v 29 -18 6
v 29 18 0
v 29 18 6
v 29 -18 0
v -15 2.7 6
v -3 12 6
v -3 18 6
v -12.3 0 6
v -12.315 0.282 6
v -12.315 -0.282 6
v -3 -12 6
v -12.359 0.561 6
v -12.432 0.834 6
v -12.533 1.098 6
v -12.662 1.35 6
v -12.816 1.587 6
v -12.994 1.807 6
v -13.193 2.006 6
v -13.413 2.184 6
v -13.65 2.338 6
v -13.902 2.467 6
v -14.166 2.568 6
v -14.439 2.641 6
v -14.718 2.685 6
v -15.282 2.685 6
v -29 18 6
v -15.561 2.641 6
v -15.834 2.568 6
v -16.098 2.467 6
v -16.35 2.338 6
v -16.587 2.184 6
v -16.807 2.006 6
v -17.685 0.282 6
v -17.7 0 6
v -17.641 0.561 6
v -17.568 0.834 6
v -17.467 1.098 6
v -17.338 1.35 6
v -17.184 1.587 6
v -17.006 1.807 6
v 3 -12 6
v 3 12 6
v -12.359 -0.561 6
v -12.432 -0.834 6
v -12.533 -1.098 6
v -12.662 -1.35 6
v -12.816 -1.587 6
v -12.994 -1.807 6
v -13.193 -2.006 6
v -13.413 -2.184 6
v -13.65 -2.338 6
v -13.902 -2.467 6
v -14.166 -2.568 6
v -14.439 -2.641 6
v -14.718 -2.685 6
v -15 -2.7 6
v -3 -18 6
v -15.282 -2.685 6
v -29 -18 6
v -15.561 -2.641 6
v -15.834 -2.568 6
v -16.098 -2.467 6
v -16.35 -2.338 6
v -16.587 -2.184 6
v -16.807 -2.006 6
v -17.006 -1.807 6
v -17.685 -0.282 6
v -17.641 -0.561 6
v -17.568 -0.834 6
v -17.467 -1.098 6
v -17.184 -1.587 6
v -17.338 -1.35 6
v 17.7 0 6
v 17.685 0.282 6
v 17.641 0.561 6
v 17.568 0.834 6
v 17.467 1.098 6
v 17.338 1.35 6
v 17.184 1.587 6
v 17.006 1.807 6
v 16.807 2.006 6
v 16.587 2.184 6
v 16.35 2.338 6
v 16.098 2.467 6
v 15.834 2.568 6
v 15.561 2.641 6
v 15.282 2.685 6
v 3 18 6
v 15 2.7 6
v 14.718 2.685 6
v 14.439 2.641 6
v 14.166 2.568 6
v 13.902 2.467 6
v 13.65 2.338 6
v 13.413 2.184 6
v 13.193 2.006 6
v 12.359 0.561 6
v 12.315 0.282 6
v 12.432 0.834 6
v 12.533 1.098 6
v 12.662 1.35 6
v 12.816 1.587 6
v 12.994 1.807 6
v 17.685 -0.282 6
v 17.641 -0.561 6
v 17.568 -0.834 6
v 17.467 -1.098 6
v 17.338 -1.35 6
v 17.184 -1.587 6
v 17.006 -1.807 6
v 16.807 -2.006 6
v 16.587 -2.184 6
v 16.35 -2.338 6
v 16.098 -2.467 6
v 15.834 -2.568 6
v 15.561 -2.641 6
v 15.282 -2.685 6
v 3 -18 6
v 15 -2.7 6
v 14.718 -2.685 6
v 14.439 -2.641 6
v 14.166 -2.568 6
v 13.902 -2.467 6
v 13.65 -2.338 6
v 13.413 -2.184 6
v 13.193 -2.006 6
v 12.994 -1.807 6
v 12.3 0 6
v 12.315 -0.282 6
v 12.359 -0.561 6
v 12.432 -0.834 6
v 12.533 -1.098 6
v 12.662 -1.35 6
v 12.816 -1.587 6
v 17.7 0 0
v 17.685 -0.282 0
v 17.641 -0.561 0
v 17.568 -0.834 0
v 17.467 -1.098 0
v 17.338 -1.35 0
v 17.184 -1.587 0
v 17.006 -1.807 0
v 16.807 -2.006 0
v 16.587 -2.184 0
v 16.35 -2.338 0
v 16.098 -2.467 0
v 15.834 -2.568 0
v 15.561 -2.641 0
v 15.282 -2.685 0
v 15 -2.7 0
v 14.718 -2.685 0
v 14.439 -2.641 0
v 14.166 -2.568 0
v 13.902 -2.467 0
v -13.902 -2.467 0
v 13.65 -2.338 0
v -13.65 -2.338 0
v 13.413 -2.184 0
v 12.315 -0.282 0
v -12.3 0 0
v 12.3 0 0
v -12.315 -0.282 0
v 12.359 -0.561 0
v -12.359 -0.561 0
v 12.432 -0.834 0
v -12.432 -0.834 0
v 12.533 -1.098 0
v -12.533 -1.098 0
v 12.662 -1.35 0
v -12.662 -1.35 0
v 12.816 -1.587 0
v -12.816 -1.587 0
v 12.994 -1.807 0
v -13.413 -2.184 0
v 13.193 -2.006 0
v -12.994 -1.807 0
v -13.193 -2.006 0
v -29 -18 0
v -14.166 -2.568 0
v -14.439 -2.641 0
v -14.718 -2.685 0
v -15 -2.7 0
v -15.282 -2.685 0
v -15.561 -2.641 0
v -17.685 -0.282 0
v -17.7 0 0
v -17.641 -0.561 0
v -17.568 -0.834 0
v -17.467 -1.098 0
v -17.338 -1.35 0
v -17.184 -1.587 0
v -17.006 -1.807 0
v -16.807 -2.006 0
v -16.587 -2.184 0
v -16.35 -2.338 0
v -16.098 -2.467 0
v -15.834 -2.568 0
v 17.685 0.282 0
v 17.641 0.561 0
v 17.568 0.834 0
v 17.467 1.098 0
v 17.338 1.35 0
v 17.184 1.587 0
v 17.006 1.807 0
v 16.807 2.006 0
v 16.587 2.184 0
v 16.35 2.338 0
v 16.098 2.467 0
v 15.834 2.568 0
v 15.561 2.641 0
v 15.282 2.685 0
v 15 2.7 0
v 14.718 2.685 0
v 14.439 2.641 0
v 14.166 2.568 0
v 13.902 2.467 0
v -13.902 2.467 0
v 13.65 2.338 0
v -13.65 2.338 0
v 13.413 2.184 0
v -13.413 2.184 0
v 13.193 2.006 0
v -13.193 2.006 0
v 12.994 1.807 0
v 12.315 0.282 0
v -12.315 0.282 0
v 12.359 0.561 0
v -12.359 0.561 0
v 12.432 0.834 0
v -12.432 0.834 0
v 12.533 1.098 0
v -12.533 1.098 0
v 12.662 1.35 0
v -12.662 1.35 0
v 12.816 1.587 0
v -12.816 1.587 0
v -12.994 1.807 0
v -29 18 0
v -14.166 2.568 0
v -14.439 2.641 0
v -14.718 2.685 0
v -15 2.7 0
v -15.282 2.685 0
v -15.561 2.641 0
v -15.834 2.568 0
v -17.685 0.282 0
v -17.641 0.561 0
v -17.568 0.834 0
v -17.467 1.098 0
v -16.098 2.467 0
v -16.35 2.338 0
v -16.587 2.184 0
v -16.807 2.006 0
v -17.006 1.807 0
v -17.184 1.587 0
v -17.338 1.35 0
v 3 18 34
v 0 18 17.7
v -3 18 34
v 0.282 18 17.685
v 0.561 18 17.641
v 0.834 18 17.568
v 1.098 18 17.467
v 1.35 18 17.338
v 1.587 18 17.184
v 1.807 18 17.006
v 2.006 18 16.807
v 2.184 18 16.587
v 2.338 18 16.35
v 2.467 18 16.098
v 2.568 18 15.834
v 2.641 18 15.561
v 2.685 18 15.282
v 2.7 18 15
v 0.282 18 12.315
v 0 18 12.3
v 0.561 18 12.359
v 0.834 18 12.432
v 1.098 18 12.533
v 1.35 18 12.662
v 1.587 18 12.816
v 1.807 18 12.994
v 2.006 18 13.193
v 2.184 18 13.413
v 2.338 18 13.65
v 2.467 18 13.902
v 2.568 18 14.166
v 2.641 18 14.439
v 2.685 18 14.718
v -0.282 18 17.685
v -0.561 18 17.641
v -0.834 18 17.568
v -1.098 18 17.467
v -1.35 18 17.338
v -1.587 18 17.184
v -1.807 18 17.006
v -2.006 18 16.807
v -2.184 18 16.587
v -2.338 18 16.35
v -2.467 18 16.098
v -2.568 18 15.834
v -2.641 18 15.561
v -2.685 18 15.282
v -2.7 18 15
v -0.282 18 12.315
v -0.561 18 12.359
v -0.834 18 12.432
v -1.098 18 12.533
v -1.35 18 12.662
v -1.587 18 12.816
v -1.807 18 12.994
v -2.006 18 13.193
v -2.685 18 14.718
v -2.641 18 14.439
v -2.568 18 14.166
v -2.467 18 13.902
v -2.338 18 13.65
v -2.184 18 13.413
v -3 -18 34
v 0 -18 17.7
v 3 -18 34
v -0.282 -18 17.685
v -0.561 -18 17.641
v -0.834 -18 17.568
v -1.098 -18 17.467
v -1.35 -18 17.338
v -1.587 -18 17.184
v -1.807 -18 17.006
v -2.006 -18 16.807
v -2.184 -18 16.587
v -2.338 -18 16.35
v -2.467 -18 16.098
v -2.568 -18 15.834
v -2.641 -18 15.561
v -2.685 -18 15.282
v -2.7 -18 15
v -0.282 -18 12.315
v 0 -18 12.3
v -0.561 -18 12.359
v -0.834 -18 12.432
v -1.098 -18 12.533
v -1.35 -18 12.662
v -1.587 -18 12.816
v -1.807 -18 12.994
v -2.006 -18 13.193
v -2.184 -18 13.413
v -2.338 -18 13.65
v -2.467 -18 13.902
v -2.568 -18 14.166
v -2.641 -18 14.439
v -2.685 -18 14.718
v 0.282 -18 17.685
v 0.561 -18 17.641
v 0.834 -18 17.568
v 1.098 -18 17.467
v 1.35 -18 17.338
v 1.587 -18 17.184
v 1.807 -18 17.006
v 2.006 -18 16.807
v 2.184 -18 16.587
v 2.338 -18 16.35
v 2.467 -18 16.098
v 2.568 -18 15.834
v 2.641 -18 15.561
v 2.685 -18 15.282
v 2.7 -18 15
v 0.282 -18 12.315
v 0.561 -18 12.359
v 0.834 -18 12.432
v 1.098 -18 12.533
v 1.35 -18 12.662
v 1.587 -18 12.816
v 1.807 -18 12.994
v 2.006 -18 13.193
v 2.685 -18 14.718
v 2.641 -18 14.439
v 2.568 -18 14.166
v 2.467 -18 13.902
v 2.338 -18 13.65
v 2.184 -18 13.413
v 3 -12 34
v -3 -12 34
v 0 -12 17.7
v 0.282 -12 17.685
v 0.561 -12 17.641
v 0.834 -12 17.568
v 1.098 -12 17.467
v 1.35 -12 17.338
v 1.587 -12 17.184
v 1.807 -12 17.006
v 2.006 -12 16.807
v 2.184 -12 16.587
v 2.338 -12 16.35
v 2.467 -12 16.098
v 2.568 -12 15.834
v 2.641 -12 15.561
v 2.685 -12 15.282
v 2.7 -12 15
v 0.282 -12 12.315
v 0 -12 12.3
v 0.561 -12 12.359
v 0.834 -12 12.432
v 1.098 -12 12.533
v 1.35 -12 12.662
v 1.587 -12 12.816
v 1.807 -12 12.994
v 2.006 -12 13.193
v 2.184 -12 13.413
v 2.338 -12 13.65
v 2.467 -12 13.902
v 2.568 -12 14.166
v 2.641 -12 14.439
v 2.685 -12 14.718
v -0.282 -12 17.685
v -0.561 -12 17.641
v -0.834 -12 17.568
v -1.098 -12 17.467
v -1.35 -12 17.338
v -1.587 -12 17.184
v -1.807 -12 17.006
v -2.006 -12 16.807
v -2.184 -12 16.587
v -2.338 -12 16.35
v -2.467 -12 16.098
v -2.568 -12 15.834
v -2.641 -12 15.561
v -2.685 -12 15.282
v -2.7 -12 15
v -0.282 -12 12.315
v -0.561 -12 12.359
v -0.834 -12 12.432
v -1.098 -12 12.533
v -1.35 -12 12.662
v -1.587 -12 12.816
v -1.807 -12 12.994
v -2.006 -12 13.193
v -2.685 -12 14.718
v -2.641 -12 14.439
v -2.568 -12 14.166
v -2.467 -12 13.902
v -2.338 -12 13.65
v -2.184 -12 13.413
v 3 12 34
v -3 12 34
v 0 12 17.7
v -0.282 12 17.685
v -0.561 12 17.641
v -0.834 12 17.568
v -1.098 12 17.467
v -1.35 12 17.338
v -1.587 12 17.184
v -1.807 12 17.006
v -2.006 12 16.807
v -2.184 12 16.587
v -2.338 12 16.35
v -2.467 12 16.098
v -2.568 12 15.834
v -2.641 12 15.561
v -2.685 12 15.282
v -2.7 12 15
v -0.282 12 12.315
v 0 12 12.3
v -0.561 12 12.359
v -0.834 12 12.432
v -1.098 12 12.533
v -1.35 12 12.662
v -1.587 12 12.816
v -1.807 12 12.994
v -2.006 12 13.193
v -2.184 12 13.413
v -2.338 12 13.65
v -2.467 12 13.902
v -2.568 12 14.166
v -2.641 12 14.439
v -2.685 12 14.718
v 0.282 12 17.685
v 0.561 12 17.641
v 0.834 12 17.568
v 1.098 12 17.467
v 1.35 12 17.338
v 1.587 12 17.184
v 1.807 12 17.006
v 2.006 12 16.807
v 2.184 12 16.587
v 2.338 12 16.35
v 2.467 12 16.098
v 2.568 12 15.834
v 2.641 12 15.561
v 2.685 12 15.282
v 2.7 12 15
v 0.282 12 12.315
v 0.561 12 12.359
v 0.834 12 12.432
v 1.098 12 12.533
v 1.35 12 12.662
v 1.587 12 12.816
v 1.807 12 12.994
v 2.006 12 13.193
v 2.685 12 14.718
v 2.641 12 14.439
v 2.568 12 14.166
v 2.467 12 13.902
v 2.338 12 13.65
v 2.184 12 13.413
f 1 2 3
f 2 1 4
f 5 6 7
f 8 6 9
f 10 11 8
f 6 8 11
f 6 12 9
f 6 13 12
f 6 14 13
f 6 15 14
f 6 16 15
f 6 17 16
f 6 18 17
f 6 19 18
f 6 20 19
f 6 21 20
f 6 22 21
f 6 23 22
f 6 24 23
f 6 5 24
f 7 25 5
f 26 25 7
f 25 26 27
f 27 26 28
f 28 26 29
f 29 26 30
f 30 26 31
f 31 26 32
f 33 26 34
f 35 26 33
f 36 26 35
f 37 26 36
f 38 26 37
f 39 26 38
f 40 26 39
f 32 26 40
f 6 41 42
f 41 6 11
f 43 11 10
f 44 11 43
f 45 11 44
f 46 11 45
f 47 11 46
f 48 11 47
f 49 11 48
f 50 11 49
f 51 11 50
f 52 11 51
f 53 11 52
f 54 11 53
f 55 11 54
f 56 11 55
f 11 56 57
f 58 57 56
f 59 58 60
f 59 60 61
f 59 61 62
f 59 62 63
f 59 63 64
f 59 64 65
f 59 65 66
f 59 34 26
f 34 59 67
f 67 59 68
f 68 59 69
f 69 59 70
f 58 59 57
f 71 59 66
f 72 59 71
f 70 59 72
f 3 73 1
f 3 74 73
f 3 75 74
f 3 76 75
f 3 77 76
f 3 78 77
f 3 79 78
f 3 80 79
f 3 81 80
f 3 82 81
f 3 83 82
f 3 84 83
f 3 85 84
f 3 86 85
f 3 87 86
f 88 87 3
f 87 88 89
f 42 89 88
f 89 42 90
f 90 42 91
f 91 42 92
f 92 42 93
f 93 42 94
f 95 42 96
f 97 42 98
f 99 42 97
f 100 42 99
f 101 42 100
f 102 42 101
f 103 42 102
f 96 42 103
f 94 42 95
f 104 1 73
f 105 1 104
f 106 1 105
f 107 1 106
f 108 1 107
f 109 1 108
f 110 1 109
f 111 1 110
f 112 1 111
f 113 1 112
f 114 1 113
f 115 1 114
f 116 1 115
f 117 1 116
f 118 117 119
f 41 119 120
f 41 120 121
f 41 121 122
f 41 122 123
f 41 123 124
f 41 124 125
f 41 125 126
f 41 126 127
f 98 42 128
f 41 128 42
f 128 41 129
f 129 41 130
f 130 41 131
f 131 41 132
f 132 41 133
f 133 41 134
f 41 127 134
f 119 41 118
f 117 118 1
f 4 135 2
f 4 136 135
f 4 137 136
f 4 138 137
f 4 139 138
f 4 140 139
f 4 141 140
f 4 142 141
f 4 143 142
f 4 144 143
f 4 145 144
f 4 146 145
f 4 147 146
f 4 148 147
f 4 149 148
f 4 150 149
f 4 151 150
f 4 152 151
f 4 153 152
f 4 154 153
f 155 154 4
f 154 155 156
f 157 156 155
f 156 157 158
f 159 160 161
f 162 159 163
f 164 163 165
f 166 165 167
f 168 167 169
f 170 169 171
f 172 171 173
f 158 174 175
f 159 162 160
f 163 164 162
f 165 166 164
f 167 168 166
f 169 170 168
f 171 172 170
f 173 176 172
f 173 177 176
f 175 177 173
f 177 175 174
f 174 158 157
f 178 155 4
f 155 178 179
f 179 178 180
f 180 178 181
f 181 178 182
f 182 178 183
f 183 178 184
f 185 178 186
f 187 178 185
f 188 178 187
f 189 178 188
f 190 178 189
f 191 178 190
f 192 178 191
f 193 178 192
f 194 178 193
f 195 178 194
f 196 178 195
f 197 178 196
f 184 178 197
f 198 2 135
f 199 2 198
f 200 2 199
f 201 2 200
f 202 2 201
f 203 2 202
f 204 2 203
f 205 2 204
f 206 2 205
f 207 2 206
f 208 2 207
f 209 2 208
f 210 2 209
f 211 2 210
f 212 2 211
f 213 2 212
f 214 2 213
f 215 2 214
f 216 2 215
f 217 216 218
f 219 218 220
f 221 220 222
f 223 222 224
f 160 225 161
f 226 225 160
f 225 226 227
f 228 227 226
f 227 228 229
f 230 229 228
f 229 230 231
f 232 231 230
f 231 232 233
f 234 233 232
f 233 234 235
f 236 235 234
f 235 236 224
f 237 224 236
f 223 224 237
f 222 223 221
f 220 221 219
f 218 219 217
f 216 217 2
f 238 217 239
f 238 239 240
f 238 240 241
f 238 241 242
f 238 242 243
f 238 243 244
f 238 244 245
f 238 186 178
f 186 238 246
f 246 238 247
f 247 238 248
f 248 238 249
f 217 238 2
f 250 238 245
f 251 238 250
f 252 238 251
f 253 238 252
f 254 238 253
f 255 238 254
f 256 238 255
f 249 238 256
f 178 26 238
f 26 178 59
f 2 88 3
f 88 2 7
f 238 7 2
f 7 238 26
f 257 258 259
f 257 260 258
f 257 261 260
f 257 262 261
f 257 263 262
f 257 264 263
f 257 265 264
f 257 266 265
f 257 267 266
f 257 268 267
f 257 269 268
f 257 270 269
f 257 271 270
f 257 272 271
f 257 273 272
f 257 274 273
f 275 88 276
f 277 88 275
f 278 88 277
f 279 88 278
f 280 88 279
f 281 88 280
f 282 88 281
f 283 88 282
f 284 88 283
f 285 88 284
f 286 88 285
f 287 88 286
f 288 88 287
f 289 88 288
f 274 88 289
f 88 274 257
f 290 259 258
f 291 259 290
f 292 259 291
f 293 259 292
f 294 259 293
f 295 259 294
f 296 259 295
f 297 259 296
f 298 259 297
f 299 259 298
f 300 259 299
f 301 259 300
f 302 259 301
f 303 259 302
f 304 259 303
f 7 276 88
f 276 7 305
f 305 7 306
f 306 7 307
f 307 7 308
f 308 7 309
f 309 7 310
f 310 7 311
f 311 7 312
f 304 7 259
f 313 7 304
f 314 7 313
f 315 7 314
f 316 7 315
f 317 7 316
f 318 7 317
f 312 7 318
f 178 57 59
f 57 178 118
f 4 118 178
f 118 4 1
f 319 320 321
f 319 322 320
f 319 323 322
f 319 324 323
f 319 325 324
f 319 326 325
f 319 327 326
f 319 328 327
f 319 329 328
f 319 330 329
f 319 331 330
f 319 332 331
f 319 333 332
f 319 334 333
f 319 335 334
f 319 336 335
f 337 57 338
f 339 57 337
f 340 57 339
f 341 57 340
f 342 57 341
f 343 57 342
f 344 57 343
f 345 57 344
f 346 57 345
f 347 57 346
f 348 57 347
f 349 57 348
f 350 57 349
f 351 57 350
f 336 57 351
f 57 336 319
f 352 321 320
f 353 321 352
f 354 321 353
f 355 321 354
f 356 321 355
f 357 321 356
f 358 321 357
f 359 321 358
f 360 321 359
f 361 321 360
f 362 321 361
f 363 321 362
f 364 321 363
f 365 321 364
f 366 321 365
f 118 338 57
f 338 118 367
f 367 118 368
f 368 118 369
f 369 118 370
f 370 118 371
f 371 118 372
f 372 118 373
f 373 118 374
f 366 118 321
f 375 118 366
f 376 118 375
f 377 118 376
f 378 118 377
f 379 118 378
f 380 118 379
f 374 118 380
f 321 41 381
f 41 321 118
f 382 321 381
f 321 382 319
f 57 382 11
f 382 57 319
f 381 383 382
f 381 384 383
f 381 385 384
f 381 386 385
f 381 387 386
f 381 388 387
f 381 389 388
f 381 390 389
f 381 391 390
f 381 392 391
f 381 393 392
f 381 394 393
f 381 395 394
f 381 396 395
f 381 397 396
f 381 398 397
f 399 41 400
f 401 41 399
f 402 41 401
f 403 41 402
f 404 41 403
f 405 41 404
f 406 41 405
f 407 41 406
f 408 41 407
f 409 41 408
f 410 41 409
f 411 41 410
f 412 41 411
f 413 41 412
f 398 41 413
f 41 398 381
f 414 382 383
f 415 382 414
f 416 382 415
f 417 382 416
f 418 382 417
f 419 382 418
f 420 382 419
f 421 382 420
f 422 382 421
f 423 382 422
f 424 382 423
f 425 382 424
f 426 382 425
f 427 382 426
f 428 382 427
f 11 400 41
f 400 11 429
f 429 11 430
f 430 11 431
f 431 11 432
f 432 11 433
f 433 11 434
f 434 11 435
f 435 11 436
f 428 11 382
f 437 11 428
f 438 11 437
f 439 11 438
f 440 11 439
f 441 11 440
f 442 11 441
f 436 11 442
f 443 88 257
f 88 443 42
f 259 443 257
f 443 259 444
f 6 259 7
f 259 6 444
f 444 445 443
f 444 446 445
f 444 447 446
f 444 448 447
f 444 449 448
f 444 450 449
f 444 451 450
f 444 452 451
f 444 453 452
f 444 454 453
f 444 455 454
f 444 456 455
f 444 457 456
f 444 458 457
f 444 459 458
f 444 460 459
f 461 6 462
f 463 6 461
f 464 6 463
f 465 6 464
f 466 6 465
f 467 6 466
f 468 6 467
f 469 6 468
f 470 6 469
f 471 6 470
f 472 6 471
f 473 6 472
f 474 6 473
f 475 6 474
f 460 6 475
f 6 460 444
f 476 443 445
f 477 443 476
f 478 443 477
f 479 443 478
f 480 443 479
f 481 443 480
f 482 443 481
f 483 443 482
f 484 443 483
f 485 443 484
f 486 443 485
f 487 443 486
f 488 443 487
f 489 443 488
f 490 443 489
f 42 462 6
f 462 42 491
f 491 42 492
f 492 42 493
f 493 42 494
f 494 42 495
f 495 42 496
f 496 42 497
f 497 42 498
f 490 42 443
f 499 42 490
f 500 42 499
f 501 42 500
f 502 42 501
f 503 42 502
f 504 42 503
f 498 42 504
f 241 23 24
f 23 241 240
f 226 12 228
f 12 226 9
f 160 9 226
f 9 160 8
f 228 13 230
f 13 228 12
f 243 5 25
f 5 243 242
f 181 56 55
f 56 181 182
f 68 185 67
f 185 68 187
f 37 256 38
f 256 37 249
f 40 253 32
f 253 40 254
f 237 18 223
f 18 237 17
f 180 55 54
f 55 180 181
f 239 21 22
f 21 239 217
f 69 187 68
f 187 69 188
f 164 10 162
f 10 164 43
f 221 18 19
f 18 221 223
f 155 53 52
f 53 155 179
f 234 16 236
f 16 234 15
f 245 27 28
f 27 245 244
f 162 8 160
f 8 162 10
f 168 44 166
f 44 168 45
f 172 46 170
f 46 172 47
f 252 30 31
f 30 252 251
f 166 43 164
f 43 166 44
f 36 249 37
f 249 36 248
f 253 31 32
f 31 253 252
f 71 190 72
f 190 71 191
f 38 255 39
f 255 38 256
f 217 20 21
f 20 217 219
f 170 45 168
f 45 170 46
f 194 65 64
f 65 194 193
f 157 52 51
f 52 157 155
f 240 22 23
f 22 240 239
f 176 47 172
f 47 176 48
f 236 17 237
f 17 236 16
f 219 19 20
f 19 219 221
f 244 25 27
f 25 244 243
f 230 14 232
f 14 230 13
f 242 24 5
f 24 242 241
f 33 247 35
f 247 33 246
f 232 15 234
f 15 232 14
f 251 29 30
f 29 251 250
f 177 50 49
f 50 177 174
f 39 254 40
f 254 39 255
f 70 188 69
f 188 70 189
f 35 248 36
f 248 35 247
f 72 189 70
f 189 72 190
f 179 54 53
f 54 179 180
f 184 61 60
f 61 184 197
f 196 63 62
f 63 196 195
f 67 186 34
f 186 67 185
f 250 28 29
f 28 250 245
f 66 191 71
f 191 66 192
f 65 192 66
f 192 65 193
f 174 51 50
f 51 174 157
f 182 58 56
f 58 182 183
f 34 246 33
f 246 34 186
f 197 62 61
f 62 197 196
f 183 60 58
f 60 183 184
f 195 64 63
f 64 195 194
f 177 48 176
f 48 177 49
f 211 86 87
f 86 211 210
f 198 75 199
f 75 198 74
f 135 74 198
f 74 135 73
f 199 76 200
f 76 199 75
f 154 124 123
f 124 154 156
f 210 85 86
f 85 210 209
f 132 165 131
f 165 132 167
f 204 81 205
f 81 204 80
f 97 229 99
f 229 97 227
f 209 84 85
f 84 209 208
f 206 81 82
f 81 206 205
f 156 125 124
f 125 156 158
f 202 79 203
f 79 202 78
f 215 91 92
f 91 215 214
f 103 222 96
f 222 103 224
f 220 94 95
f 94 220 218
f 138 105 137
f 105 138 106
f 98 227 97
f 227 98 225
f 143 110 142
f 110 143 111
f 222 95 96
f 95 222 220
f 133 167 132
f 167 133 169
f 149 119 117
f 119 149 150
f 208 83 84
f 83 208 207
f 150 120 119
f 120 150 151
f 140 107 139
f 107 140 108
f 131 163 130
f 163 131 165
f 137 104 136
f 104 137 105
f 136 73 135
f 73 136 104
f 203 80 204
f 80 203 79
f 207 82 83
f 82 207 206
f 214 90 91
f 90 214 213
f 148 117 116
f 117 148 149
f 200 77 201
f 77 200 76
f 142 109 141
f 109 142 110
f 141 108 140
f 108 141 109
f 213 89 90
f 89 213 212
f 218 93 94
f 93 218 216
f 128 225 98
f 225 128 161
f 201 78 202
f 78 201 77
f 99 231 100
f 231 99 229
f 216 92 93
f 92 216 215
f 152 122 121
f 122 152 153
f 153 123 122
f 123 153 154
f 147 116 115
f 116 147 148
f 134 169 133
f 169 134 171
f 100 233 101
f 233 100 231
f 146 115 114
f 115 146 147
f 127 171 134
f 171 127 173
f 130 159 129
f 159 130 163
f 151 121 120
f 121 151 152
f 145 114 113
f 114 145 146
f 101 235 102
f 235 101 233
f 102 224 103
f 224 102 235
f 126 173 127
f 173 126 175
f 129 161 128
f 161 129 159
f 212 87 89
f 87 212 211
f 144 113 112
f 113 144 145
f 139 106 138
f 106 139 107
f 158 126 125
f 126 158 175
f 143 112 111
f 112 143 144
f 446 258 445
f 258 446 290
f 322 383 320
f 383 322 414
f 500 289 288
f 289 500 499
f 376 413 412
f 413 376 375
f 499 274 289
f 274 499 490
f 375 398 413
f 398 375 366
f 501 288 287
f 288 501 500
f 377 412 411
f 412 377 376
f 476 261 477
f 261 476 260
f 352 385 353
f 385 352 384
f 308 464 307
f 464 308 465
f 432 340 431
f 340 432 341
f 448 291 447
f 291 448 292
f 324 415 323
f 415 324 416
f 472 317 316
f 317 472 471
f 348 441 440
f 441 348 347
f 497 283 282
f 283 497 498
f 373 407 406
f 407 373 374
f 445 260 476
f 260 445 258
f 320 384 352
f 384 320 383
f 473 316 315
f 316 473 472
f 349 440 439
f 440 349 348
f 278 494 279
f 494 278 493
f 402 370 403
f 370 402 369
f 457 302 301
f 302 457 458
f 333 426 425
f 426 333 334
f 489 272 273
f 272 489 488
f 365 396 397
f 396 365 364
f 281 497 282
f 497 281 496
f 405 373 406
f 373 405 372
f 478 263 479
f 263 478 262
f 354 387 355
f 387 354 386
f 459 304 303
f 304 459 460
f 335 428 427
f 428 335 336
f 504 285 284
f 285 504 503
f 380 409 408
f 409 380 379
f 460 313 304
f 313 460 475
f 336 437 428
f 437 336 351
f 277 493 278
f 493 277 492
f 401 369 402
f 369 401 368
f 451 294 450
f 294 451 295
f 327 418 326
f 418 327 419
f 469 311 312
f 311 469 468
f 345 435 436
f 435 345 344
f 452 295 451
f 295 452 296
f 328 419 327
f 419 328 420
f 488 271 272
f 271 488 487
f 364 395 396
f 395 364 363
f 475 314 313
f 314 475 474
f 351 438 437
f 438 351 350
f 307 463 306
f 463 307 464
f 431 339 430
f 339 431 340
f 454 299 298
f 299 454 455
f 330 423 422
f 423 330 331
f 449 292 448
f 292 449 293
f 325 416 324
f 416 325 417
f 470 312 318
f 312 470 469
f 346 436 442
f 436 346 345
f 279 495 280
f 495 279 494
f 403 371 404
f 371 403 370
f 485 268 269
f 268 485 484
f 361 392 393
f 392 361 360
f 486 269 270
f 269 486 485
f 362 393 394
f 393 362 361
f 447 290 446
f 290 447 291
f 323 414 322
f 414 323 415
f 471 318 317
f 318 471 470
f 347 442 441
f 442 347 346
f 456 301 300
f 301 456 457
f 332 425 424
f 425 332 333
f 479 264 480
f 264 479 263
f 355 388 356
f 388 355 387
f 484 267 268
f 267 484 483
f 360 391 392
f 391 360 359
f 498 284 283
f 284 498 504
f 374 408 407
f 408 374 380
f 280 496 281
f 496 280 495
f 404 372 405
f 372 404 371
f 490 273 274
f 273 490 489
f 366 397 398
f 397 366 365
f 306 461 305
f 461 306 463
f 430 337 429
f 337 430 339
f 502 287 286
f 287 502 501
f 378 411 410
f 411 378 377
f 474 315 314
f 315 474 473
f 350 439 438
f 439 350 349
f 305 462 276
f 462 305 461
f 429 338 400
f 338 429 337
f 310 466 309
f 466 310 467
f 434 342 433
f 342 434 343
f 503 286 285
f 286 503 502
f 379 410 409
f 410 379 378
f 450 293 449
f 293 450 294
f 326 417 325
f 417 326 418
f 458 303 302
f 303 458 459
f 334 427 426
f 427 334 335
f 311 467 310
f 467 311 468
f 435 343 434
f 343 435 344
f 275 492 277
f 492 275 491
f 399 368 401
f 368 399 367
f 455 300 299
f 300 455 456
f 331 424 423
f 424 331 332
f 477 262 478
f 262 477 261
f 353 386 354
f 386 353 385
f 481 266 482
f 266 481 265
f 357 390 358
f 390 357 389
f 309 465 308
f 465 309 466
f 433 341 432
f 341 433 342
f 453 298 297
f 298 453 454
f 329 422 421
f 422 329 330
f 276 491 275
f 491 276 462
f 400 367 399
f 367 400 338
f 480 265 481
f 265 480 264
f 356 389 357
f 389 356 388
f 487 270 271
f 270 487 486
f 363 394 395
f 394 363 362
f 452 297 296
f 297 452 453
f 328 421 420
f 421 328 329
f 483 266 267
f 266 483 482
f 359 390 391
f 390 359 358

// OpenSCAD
// Clevis mounting bracket for M5 pin.
$fn = 60;
eps = 0.02;
opening = 24;
ear_h = 30;
base_l = 58;
base_w = opening + 12;
base_t = 6;
ear_t = 6;
difference() {
    union() {
        translate([-base_l / 2, -base_w / 2, 0]) cube([base_l, base_w, base_t]);
        translate([-ear_t / 2, -base_w / 2, base_t - 2]) cube([ear_t, ear_t, ear_h]);
        translate([-ear_t / 2, base_w / 2 - ear_t, base_t - 2]) cube([ear_t, ear_t, ear_h]);
    }
    for (x = [-15, 15]) translate([x, 0, -eps]) cylinder(d = 5.4, h = base_t + 2 * eps);
    translate([0, -base_w / 2 - eps, ear_h / 2]) rotate([-90, 0, 0]) cylinder(d = 5.4, h = base_w + 2 * eps);
}
